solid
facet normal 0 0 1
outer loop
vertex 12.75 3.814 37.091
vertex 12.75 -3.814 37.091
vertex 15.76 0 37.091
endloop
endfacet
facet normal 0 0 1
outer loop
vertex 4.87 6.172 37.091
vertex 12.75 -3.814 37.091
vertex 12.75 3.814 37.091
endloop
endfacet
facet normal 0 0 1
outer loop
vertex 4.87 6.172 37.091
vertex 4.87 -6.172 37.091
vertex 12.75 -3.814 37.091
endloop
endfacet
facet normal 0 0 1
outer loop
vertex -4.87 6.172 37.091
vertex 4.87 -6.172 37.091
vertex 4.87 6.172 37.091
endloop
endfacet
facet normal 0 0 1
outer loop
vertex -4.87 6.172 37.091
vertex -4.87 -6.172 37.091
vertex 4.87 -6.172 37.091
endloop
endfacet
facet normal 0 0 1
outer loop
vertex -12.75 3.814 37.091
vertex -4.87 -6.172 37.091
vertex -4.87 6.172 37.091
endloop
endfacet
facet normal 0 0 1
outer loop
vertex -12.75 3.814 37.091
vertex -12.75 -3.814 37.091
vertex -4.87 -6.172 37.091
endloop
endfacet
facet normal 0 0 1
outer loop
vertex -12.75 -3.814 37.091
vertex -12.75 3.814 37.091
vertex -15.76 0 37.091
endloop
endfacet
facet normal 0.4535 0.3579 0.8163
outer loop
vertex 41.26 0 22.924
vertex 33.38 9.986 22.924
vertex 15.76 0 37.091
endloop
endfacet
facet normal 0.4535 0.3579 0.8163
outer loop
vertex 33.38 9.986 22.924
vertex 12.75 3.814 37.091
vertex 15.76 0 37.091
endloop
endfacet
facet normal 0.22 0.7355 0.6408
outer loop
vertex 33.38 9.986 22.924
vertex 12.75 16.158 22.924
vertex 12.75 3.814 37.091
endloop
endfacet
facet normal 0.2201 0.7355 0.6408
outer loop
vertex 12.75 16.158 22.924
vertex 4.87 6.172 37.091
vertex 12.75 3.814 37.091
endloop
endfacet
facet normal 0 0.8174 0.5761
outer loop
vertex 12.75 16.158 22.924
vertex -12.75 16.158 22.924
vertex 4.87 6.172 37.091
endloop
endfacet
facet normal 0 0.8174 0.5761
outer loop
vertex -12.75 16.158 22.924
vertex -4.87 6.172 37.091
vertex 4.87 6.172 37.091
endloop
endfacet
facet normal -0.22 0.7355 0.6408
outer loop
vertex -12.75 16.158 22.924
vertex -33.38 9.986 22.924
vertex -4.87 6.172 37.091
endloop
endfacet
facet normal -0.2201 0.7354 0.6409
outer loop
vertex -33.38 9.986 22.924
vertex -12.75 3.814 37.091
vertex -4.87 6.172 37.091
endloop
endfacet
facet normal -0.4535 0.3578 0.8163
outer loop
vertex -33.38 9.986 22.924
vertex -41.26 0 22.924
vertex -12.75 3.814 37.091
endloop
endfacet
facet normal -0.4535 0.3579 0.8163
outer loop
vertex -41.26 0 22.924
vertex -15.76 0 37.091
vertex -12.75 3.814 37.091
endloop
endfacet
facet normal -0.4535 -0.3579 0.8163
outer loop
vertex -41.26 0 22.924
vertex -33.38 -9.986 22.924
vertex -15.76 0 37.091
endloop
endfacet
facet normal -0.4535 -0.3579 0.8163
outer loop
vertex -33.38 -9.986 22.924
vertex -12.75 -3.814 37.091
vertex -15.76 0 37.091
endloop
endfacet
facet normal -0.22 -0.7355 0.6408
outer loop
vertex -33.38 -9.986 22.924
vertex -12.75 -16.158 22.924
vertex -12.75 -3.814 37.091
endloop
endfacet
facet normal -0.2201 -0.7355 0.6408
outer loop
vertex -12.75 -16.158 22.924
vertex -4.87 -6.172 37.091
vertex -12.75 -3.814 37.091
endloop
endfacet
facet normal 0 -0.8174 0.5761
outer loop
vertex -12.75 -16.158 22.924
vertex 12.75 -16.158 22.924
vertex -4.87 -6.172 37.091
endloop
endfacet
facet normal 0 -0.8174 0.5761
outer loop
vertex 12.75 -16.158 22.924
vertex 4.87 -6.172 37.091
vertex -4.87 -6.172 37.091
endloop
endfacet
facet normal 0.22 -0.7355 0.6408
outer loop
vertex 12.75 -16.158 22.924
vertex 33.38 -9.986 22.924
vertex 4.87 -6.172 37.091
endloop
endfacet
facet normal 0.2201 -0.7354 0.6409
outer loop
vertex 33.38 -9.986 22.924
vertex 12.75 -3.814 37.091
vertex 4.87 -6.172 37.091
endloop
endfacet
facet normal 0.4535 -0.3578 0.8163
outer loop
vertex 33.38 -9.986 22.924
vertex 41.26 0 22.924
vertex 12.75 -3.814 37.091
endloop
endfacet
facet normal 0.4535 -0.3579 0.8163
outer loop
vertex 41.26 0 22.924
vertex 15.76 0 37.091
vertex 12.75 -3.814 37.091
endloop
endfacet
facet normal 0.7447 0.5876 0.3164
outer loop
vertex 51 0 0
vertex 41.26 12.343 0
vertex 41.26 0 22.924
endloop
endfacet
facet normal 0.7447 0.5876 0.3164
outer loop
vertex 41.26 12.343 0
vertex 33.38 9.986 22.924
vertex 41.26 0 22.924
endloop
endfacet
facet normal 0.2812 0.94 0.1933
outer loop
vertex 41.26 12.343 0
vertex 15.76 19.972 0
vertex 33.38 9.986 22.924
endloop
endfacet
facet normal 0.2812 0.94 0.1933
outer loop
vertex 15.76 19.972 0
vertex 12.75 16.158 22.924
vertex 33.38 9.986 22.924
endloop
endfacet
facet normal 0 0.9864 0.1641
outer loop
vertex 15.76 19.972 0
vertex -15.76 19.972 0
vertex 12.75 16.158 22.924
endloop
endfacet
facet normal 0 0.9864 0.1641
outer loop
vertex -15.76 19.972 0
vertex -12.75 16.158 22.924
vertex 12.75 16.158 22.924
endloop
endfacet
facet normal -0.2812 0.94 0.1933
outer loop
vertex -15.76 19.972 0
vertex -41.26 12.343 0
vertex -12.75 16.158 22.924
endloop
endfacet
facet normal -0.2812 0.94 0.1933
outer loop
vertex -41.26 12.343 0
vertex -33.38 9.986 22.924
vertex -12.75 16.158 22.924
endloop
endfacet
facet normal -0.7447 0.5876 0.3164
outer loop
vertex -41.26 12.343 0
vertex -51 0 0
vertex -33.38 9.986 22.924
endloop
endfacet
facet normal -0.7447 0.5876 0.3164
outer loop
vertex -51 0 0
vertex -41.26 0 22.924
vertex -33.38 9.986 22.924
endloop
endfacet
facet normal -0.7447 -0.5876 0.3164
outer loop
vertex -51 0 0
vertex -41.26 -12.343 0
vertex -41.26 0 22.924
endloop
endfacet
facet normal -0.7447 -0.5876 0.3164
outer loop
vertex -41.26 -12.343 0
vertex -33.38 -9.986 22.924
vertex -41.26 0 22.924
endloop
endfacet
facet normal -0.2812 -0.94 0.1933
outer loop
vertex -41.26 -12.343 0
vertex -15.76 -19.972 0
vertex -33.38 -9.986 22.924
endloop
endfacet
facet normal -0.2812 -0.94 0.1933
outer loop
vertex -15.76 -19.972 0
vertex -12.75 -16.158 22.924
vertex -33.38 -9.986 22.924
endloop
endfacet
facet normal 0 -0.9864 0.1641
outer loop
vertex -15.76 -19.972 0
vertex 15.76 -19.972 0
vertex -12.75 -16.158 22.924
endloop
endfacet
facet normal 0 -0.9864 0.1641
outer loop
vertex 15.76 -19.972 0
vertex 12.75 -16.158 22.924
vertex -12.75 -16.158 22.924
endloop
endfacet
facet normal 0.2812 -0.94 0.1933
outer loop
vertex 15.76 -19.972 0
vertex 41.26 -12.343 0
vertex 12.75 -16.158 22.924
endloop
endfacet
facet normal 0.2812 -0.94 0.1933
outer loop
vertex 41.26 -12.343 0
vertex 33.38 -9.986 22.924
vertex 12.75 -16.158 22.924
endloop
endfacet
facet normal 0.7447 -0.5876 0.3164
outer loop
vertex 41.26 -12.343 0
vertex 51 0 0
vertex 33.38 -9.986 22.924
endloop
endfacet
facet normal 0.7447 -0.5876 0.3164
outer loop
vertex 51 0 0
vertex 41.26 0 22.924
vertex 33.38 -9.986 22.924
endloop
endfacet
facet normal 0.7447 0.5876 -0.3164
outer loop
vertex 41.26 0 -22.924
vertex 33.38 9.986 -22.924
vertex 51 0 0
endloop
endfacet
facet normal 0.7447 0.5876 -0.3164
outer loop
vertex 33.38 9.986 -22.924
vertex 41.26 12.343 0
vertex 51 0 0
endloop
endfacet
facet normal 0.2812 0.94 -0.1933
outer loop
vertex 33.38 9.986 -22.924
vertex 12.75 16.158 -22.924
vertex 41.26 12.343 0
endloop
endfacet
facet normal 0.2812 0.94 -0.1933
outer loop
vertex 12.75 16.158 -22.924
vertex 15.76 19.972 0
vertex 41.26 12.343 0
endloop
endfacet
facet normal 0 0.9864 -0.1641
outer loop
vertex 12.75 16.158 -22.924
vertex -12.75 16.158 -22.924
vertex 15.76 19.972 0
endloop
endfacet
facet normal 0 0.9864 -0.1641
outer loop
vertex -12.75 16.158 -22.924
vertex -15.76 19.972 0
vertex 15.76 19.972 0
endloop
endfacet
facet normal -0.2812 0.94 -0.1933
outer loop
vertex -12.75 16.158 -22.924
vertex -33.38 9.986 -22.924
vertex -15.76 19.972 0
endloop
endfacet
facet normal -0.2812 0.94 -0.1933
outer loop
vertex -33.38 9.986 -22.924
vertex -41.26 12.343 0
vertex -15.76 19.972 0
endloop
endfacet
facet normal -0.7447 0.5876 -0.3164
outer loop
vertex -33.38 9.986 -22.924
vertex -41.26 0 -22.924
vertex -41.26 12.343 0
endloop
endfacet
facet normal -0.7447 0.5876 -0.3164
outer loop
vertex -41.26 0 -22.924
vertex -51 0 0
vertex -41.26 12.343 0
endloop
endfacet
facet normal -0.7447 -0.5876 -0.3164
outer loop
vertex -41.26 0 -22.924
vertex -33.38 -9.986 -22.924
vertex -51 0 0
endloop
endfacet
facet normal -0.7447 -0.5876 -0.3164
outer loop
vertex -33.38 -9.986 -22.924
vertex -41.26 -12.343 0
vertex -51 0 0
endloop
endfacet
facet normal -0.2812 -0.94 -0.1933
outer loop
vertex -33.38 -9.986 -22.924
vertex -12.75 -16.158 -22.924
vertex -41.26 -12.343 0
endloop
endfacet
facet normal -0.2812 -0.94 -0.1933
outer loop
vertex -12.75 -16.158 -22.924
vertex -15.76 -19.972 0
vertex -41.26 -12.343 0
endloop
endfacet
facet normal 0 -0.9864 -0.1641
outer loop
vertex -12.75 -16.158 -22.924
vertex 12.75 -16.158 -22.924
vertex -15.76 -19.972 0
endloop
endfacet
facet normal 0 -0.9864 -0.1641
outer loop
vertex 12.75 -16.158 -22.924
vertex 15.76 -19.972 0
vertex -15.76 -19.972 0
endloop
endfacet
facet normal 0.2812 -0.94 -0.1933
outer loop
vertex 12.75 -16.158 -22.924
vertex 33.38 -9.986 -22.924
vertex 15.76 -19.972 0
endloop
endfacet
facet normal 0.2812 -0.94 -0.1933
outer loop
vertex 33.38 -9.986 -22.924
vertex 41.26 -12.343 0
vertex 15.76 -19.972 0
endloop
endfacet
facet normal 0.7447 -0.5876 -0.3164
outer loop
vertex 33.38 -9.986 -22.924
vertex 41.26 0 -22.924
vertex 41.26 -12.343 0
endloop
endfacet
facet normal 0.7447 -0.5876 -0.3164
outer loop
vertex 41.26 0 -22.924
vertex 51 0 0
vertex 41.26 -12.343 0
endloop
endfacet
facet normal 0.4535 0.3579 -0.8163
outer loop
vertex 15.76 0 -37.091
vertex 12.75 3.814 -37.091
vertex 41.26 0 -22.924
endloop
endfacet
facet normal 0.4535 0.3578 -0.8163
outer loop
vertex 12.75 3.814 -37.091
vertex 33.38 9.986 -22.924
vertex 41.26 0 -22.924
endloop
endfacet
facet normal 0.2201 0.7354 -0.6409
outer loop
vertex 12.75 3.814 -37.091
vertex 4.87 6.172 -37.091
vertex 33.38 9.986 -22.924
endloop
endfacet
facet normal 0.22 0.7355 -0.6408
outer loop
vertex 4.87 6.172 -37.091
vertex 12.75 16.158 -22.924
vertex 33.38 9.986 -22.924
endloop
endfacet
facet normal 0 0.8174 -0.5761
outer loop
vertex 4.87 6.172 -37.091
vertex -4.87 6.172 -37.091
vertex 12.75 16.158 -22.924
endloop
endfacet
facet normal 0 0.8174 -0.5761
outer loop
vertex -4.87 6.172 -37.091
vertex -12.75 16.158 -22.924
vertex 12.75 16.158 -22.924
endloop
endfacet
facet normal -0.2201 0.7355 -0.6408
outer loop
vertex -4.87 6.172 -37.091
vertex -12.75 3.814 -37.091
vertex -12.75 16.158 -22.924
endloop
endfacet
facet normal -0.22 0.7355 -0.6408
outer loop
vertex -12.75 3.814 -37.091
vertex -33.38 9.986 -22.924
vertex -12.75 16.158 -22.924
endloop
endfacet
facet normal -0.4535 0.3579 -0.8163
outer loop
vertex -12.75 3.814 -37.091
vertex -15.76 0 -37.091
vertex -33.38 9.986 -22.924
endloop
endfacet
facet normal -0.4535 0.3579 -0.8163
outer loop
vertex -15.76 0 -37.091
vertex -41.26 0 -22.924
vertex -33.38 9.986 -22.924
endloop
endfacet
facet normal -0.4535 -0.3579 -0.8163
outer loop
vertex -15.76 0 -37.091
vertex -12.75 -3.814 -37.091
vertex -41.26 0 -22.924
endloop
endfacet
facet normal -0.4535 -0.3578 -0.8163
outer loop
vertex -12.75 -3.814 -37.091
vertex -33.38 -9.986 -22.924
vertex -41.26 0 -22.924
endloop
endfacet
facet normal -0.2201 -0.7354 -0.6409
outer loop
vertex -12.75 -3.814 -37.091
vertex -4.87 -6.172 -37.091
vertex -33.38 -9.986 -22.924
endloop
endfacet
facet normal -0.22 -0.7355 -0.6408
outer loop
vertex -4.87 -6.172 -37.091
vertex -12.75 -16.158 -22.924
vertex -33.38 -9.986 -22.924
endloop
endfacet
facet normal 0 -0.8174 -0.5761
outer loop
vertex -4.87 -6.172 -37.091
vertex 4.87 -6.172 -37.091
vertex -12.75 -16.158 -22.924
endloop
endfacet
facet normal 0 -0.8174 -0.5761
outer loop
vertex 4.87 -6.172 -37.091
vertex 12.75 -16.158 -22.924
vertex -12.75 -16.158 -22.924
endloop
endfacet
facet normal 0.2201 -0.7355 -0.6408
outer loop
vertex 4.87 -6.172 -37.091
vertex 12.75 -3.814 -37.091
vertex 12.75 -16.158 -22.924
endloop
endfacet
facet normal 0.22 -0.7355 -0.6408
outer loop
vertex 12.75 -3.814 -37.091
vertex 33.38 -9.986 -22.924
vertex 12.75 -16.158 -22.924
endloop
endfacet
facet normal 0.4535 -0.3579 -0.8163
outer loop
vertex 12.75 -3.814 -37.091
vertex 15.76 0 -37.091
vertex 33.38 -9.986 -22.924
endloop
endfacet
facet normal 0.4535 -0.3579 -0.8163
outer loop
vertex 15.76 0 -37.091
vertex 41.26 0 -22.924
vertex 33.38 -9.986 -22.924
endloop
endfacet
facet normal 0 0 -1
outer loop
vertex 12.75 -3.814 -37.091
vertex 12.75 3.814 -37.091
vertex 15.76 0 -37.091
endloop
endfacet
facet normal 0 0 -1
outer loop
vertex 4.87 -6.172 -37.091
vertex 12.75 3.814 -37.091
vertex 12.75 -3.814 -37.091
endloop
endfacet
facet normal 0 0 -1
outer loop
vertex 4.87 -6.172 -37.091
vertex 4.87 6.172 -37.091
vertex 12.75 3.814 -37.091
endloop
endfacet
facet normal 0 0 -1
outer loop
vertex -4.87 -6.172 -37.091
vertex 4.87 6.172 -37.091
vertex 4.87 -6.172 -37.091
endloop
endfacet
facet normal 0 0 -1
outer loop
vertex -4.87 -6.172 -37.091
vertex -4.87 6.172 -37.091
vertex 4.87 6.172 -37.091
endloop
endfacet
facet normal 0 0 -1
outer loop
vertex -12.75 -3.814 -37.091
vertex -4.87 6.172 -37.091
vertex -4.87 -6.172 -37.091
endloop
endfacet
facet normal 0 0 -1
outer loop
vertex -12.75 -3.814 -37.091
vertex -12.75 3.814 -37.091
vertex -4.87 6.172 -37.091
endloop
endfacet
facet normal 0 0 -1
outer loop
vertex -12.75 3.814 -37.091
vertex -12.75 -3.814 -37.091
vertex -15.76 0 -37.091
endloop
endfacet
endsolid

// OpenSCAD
// Generated by SolidPython 1.0.1 on 2020-07-29 00:46:52


scale(v = [17, 7, 13]) {
	sphere(r = 3);
}
/***********************************************
*********      SolidPython code:      **********
************************************************
 
# import packages: SolidPython
from solid import *
from solid.utils import *
from itertools import chain, combinations, permutations


class Resize:

    def __init__(self, scad_file):
        self.scad_file = scad_file
        #self.scad_file = import_scad(scad_file)
        # cone/cylinder param:
        self.r1 = 0
        self.r2 = 0
        self.h = 0
        # rectangular prism param:
        self.w = 0
        self.l = 0
        # ellipse param:
        self.r = 0

    # import OpenScad code (file name corresponds to shape)


    # classify shape + parameters
    def assign(self, param1, param2, param3):
        if self.scad_file == 'cone.scad':
            self.r1 = param1
            self.r2 = param2
            self.h = param3
        elif self.scad_file == 'cylinder.scad':
            self.r1 = param1
            self.r2 = param2
            self.h = param3
        elif self.scad_file == 'rectangularPrism.scad':
            self.h = param1
            self.l = param2
            self.w = param3
        else:
            self.r = param1
            self.h = param2

    # resize parameters
    def iterate(self):
        x = range(3, 20, 2)
        i = 1
        if self.scad_file == 'cone.scad':
            tempList = list(permutations(x, 2))
            for temp in tempList:
                param1 = temp[0]
                param2 = temp[1]
                filepath = 'produced_scad_files/' + 'cone' + str(param1) + '_' + str(param2) + '_' + '.scad'
                scad_render_to_file(cylinder(h=param1, r1=param2, r2=0), filepath)

        elif self.scad_file == 'cylinder.scad':
            tempList = list(permutations(x, 3))
            for temp in tempList:
                param1 = temp[0]
                param2 = temp[1]
                filepath = 'produced_scad_files/' + 'cylinder' + str(param1) + '_' + str(param2) + '_' + '.scad'
                scad_render_to_file(cylinder(h=param1, r1=param2, r2=param2), filepath)

        elif self.scad_file == 'rectangularPrism.scad':
            tempList = list(permutations(x, 3))
            for temp in tempList:
                param1 = temp[0]
                param2 = temp[1]
                param3 = temp[2]
                filepath = 'produced_scad_files/' + 'rectangularPrism' + str(param1) + '_' + str(param2) + '_' + str(
                    param3) + '.scad'
                scad_render_to_file(cube(size=(param1, param2, param3)), filepath)

        elif self.scad_file == 'ellipse.scad':
            tempList = list(permutations(x, 4))
            for temp in tempList:
                param1 = temp[0]
                param2 = temp[1]
                param3 = temp[2]
                param4 = temp[3]
                filepath = 'produced_scad_files/' + 'ellipse' + str(param1) + '_' + str(param2) + '_' + str(param3) + '_' + str(param4) + '.scad'
                scad_render_to_file(scale([param1, param2, param3])(sphere(r=param4)), filepath)

    def render_to_scadfile(self):
        scad_render_to_file(scad, 'example.scad') 
 
************************************************/
